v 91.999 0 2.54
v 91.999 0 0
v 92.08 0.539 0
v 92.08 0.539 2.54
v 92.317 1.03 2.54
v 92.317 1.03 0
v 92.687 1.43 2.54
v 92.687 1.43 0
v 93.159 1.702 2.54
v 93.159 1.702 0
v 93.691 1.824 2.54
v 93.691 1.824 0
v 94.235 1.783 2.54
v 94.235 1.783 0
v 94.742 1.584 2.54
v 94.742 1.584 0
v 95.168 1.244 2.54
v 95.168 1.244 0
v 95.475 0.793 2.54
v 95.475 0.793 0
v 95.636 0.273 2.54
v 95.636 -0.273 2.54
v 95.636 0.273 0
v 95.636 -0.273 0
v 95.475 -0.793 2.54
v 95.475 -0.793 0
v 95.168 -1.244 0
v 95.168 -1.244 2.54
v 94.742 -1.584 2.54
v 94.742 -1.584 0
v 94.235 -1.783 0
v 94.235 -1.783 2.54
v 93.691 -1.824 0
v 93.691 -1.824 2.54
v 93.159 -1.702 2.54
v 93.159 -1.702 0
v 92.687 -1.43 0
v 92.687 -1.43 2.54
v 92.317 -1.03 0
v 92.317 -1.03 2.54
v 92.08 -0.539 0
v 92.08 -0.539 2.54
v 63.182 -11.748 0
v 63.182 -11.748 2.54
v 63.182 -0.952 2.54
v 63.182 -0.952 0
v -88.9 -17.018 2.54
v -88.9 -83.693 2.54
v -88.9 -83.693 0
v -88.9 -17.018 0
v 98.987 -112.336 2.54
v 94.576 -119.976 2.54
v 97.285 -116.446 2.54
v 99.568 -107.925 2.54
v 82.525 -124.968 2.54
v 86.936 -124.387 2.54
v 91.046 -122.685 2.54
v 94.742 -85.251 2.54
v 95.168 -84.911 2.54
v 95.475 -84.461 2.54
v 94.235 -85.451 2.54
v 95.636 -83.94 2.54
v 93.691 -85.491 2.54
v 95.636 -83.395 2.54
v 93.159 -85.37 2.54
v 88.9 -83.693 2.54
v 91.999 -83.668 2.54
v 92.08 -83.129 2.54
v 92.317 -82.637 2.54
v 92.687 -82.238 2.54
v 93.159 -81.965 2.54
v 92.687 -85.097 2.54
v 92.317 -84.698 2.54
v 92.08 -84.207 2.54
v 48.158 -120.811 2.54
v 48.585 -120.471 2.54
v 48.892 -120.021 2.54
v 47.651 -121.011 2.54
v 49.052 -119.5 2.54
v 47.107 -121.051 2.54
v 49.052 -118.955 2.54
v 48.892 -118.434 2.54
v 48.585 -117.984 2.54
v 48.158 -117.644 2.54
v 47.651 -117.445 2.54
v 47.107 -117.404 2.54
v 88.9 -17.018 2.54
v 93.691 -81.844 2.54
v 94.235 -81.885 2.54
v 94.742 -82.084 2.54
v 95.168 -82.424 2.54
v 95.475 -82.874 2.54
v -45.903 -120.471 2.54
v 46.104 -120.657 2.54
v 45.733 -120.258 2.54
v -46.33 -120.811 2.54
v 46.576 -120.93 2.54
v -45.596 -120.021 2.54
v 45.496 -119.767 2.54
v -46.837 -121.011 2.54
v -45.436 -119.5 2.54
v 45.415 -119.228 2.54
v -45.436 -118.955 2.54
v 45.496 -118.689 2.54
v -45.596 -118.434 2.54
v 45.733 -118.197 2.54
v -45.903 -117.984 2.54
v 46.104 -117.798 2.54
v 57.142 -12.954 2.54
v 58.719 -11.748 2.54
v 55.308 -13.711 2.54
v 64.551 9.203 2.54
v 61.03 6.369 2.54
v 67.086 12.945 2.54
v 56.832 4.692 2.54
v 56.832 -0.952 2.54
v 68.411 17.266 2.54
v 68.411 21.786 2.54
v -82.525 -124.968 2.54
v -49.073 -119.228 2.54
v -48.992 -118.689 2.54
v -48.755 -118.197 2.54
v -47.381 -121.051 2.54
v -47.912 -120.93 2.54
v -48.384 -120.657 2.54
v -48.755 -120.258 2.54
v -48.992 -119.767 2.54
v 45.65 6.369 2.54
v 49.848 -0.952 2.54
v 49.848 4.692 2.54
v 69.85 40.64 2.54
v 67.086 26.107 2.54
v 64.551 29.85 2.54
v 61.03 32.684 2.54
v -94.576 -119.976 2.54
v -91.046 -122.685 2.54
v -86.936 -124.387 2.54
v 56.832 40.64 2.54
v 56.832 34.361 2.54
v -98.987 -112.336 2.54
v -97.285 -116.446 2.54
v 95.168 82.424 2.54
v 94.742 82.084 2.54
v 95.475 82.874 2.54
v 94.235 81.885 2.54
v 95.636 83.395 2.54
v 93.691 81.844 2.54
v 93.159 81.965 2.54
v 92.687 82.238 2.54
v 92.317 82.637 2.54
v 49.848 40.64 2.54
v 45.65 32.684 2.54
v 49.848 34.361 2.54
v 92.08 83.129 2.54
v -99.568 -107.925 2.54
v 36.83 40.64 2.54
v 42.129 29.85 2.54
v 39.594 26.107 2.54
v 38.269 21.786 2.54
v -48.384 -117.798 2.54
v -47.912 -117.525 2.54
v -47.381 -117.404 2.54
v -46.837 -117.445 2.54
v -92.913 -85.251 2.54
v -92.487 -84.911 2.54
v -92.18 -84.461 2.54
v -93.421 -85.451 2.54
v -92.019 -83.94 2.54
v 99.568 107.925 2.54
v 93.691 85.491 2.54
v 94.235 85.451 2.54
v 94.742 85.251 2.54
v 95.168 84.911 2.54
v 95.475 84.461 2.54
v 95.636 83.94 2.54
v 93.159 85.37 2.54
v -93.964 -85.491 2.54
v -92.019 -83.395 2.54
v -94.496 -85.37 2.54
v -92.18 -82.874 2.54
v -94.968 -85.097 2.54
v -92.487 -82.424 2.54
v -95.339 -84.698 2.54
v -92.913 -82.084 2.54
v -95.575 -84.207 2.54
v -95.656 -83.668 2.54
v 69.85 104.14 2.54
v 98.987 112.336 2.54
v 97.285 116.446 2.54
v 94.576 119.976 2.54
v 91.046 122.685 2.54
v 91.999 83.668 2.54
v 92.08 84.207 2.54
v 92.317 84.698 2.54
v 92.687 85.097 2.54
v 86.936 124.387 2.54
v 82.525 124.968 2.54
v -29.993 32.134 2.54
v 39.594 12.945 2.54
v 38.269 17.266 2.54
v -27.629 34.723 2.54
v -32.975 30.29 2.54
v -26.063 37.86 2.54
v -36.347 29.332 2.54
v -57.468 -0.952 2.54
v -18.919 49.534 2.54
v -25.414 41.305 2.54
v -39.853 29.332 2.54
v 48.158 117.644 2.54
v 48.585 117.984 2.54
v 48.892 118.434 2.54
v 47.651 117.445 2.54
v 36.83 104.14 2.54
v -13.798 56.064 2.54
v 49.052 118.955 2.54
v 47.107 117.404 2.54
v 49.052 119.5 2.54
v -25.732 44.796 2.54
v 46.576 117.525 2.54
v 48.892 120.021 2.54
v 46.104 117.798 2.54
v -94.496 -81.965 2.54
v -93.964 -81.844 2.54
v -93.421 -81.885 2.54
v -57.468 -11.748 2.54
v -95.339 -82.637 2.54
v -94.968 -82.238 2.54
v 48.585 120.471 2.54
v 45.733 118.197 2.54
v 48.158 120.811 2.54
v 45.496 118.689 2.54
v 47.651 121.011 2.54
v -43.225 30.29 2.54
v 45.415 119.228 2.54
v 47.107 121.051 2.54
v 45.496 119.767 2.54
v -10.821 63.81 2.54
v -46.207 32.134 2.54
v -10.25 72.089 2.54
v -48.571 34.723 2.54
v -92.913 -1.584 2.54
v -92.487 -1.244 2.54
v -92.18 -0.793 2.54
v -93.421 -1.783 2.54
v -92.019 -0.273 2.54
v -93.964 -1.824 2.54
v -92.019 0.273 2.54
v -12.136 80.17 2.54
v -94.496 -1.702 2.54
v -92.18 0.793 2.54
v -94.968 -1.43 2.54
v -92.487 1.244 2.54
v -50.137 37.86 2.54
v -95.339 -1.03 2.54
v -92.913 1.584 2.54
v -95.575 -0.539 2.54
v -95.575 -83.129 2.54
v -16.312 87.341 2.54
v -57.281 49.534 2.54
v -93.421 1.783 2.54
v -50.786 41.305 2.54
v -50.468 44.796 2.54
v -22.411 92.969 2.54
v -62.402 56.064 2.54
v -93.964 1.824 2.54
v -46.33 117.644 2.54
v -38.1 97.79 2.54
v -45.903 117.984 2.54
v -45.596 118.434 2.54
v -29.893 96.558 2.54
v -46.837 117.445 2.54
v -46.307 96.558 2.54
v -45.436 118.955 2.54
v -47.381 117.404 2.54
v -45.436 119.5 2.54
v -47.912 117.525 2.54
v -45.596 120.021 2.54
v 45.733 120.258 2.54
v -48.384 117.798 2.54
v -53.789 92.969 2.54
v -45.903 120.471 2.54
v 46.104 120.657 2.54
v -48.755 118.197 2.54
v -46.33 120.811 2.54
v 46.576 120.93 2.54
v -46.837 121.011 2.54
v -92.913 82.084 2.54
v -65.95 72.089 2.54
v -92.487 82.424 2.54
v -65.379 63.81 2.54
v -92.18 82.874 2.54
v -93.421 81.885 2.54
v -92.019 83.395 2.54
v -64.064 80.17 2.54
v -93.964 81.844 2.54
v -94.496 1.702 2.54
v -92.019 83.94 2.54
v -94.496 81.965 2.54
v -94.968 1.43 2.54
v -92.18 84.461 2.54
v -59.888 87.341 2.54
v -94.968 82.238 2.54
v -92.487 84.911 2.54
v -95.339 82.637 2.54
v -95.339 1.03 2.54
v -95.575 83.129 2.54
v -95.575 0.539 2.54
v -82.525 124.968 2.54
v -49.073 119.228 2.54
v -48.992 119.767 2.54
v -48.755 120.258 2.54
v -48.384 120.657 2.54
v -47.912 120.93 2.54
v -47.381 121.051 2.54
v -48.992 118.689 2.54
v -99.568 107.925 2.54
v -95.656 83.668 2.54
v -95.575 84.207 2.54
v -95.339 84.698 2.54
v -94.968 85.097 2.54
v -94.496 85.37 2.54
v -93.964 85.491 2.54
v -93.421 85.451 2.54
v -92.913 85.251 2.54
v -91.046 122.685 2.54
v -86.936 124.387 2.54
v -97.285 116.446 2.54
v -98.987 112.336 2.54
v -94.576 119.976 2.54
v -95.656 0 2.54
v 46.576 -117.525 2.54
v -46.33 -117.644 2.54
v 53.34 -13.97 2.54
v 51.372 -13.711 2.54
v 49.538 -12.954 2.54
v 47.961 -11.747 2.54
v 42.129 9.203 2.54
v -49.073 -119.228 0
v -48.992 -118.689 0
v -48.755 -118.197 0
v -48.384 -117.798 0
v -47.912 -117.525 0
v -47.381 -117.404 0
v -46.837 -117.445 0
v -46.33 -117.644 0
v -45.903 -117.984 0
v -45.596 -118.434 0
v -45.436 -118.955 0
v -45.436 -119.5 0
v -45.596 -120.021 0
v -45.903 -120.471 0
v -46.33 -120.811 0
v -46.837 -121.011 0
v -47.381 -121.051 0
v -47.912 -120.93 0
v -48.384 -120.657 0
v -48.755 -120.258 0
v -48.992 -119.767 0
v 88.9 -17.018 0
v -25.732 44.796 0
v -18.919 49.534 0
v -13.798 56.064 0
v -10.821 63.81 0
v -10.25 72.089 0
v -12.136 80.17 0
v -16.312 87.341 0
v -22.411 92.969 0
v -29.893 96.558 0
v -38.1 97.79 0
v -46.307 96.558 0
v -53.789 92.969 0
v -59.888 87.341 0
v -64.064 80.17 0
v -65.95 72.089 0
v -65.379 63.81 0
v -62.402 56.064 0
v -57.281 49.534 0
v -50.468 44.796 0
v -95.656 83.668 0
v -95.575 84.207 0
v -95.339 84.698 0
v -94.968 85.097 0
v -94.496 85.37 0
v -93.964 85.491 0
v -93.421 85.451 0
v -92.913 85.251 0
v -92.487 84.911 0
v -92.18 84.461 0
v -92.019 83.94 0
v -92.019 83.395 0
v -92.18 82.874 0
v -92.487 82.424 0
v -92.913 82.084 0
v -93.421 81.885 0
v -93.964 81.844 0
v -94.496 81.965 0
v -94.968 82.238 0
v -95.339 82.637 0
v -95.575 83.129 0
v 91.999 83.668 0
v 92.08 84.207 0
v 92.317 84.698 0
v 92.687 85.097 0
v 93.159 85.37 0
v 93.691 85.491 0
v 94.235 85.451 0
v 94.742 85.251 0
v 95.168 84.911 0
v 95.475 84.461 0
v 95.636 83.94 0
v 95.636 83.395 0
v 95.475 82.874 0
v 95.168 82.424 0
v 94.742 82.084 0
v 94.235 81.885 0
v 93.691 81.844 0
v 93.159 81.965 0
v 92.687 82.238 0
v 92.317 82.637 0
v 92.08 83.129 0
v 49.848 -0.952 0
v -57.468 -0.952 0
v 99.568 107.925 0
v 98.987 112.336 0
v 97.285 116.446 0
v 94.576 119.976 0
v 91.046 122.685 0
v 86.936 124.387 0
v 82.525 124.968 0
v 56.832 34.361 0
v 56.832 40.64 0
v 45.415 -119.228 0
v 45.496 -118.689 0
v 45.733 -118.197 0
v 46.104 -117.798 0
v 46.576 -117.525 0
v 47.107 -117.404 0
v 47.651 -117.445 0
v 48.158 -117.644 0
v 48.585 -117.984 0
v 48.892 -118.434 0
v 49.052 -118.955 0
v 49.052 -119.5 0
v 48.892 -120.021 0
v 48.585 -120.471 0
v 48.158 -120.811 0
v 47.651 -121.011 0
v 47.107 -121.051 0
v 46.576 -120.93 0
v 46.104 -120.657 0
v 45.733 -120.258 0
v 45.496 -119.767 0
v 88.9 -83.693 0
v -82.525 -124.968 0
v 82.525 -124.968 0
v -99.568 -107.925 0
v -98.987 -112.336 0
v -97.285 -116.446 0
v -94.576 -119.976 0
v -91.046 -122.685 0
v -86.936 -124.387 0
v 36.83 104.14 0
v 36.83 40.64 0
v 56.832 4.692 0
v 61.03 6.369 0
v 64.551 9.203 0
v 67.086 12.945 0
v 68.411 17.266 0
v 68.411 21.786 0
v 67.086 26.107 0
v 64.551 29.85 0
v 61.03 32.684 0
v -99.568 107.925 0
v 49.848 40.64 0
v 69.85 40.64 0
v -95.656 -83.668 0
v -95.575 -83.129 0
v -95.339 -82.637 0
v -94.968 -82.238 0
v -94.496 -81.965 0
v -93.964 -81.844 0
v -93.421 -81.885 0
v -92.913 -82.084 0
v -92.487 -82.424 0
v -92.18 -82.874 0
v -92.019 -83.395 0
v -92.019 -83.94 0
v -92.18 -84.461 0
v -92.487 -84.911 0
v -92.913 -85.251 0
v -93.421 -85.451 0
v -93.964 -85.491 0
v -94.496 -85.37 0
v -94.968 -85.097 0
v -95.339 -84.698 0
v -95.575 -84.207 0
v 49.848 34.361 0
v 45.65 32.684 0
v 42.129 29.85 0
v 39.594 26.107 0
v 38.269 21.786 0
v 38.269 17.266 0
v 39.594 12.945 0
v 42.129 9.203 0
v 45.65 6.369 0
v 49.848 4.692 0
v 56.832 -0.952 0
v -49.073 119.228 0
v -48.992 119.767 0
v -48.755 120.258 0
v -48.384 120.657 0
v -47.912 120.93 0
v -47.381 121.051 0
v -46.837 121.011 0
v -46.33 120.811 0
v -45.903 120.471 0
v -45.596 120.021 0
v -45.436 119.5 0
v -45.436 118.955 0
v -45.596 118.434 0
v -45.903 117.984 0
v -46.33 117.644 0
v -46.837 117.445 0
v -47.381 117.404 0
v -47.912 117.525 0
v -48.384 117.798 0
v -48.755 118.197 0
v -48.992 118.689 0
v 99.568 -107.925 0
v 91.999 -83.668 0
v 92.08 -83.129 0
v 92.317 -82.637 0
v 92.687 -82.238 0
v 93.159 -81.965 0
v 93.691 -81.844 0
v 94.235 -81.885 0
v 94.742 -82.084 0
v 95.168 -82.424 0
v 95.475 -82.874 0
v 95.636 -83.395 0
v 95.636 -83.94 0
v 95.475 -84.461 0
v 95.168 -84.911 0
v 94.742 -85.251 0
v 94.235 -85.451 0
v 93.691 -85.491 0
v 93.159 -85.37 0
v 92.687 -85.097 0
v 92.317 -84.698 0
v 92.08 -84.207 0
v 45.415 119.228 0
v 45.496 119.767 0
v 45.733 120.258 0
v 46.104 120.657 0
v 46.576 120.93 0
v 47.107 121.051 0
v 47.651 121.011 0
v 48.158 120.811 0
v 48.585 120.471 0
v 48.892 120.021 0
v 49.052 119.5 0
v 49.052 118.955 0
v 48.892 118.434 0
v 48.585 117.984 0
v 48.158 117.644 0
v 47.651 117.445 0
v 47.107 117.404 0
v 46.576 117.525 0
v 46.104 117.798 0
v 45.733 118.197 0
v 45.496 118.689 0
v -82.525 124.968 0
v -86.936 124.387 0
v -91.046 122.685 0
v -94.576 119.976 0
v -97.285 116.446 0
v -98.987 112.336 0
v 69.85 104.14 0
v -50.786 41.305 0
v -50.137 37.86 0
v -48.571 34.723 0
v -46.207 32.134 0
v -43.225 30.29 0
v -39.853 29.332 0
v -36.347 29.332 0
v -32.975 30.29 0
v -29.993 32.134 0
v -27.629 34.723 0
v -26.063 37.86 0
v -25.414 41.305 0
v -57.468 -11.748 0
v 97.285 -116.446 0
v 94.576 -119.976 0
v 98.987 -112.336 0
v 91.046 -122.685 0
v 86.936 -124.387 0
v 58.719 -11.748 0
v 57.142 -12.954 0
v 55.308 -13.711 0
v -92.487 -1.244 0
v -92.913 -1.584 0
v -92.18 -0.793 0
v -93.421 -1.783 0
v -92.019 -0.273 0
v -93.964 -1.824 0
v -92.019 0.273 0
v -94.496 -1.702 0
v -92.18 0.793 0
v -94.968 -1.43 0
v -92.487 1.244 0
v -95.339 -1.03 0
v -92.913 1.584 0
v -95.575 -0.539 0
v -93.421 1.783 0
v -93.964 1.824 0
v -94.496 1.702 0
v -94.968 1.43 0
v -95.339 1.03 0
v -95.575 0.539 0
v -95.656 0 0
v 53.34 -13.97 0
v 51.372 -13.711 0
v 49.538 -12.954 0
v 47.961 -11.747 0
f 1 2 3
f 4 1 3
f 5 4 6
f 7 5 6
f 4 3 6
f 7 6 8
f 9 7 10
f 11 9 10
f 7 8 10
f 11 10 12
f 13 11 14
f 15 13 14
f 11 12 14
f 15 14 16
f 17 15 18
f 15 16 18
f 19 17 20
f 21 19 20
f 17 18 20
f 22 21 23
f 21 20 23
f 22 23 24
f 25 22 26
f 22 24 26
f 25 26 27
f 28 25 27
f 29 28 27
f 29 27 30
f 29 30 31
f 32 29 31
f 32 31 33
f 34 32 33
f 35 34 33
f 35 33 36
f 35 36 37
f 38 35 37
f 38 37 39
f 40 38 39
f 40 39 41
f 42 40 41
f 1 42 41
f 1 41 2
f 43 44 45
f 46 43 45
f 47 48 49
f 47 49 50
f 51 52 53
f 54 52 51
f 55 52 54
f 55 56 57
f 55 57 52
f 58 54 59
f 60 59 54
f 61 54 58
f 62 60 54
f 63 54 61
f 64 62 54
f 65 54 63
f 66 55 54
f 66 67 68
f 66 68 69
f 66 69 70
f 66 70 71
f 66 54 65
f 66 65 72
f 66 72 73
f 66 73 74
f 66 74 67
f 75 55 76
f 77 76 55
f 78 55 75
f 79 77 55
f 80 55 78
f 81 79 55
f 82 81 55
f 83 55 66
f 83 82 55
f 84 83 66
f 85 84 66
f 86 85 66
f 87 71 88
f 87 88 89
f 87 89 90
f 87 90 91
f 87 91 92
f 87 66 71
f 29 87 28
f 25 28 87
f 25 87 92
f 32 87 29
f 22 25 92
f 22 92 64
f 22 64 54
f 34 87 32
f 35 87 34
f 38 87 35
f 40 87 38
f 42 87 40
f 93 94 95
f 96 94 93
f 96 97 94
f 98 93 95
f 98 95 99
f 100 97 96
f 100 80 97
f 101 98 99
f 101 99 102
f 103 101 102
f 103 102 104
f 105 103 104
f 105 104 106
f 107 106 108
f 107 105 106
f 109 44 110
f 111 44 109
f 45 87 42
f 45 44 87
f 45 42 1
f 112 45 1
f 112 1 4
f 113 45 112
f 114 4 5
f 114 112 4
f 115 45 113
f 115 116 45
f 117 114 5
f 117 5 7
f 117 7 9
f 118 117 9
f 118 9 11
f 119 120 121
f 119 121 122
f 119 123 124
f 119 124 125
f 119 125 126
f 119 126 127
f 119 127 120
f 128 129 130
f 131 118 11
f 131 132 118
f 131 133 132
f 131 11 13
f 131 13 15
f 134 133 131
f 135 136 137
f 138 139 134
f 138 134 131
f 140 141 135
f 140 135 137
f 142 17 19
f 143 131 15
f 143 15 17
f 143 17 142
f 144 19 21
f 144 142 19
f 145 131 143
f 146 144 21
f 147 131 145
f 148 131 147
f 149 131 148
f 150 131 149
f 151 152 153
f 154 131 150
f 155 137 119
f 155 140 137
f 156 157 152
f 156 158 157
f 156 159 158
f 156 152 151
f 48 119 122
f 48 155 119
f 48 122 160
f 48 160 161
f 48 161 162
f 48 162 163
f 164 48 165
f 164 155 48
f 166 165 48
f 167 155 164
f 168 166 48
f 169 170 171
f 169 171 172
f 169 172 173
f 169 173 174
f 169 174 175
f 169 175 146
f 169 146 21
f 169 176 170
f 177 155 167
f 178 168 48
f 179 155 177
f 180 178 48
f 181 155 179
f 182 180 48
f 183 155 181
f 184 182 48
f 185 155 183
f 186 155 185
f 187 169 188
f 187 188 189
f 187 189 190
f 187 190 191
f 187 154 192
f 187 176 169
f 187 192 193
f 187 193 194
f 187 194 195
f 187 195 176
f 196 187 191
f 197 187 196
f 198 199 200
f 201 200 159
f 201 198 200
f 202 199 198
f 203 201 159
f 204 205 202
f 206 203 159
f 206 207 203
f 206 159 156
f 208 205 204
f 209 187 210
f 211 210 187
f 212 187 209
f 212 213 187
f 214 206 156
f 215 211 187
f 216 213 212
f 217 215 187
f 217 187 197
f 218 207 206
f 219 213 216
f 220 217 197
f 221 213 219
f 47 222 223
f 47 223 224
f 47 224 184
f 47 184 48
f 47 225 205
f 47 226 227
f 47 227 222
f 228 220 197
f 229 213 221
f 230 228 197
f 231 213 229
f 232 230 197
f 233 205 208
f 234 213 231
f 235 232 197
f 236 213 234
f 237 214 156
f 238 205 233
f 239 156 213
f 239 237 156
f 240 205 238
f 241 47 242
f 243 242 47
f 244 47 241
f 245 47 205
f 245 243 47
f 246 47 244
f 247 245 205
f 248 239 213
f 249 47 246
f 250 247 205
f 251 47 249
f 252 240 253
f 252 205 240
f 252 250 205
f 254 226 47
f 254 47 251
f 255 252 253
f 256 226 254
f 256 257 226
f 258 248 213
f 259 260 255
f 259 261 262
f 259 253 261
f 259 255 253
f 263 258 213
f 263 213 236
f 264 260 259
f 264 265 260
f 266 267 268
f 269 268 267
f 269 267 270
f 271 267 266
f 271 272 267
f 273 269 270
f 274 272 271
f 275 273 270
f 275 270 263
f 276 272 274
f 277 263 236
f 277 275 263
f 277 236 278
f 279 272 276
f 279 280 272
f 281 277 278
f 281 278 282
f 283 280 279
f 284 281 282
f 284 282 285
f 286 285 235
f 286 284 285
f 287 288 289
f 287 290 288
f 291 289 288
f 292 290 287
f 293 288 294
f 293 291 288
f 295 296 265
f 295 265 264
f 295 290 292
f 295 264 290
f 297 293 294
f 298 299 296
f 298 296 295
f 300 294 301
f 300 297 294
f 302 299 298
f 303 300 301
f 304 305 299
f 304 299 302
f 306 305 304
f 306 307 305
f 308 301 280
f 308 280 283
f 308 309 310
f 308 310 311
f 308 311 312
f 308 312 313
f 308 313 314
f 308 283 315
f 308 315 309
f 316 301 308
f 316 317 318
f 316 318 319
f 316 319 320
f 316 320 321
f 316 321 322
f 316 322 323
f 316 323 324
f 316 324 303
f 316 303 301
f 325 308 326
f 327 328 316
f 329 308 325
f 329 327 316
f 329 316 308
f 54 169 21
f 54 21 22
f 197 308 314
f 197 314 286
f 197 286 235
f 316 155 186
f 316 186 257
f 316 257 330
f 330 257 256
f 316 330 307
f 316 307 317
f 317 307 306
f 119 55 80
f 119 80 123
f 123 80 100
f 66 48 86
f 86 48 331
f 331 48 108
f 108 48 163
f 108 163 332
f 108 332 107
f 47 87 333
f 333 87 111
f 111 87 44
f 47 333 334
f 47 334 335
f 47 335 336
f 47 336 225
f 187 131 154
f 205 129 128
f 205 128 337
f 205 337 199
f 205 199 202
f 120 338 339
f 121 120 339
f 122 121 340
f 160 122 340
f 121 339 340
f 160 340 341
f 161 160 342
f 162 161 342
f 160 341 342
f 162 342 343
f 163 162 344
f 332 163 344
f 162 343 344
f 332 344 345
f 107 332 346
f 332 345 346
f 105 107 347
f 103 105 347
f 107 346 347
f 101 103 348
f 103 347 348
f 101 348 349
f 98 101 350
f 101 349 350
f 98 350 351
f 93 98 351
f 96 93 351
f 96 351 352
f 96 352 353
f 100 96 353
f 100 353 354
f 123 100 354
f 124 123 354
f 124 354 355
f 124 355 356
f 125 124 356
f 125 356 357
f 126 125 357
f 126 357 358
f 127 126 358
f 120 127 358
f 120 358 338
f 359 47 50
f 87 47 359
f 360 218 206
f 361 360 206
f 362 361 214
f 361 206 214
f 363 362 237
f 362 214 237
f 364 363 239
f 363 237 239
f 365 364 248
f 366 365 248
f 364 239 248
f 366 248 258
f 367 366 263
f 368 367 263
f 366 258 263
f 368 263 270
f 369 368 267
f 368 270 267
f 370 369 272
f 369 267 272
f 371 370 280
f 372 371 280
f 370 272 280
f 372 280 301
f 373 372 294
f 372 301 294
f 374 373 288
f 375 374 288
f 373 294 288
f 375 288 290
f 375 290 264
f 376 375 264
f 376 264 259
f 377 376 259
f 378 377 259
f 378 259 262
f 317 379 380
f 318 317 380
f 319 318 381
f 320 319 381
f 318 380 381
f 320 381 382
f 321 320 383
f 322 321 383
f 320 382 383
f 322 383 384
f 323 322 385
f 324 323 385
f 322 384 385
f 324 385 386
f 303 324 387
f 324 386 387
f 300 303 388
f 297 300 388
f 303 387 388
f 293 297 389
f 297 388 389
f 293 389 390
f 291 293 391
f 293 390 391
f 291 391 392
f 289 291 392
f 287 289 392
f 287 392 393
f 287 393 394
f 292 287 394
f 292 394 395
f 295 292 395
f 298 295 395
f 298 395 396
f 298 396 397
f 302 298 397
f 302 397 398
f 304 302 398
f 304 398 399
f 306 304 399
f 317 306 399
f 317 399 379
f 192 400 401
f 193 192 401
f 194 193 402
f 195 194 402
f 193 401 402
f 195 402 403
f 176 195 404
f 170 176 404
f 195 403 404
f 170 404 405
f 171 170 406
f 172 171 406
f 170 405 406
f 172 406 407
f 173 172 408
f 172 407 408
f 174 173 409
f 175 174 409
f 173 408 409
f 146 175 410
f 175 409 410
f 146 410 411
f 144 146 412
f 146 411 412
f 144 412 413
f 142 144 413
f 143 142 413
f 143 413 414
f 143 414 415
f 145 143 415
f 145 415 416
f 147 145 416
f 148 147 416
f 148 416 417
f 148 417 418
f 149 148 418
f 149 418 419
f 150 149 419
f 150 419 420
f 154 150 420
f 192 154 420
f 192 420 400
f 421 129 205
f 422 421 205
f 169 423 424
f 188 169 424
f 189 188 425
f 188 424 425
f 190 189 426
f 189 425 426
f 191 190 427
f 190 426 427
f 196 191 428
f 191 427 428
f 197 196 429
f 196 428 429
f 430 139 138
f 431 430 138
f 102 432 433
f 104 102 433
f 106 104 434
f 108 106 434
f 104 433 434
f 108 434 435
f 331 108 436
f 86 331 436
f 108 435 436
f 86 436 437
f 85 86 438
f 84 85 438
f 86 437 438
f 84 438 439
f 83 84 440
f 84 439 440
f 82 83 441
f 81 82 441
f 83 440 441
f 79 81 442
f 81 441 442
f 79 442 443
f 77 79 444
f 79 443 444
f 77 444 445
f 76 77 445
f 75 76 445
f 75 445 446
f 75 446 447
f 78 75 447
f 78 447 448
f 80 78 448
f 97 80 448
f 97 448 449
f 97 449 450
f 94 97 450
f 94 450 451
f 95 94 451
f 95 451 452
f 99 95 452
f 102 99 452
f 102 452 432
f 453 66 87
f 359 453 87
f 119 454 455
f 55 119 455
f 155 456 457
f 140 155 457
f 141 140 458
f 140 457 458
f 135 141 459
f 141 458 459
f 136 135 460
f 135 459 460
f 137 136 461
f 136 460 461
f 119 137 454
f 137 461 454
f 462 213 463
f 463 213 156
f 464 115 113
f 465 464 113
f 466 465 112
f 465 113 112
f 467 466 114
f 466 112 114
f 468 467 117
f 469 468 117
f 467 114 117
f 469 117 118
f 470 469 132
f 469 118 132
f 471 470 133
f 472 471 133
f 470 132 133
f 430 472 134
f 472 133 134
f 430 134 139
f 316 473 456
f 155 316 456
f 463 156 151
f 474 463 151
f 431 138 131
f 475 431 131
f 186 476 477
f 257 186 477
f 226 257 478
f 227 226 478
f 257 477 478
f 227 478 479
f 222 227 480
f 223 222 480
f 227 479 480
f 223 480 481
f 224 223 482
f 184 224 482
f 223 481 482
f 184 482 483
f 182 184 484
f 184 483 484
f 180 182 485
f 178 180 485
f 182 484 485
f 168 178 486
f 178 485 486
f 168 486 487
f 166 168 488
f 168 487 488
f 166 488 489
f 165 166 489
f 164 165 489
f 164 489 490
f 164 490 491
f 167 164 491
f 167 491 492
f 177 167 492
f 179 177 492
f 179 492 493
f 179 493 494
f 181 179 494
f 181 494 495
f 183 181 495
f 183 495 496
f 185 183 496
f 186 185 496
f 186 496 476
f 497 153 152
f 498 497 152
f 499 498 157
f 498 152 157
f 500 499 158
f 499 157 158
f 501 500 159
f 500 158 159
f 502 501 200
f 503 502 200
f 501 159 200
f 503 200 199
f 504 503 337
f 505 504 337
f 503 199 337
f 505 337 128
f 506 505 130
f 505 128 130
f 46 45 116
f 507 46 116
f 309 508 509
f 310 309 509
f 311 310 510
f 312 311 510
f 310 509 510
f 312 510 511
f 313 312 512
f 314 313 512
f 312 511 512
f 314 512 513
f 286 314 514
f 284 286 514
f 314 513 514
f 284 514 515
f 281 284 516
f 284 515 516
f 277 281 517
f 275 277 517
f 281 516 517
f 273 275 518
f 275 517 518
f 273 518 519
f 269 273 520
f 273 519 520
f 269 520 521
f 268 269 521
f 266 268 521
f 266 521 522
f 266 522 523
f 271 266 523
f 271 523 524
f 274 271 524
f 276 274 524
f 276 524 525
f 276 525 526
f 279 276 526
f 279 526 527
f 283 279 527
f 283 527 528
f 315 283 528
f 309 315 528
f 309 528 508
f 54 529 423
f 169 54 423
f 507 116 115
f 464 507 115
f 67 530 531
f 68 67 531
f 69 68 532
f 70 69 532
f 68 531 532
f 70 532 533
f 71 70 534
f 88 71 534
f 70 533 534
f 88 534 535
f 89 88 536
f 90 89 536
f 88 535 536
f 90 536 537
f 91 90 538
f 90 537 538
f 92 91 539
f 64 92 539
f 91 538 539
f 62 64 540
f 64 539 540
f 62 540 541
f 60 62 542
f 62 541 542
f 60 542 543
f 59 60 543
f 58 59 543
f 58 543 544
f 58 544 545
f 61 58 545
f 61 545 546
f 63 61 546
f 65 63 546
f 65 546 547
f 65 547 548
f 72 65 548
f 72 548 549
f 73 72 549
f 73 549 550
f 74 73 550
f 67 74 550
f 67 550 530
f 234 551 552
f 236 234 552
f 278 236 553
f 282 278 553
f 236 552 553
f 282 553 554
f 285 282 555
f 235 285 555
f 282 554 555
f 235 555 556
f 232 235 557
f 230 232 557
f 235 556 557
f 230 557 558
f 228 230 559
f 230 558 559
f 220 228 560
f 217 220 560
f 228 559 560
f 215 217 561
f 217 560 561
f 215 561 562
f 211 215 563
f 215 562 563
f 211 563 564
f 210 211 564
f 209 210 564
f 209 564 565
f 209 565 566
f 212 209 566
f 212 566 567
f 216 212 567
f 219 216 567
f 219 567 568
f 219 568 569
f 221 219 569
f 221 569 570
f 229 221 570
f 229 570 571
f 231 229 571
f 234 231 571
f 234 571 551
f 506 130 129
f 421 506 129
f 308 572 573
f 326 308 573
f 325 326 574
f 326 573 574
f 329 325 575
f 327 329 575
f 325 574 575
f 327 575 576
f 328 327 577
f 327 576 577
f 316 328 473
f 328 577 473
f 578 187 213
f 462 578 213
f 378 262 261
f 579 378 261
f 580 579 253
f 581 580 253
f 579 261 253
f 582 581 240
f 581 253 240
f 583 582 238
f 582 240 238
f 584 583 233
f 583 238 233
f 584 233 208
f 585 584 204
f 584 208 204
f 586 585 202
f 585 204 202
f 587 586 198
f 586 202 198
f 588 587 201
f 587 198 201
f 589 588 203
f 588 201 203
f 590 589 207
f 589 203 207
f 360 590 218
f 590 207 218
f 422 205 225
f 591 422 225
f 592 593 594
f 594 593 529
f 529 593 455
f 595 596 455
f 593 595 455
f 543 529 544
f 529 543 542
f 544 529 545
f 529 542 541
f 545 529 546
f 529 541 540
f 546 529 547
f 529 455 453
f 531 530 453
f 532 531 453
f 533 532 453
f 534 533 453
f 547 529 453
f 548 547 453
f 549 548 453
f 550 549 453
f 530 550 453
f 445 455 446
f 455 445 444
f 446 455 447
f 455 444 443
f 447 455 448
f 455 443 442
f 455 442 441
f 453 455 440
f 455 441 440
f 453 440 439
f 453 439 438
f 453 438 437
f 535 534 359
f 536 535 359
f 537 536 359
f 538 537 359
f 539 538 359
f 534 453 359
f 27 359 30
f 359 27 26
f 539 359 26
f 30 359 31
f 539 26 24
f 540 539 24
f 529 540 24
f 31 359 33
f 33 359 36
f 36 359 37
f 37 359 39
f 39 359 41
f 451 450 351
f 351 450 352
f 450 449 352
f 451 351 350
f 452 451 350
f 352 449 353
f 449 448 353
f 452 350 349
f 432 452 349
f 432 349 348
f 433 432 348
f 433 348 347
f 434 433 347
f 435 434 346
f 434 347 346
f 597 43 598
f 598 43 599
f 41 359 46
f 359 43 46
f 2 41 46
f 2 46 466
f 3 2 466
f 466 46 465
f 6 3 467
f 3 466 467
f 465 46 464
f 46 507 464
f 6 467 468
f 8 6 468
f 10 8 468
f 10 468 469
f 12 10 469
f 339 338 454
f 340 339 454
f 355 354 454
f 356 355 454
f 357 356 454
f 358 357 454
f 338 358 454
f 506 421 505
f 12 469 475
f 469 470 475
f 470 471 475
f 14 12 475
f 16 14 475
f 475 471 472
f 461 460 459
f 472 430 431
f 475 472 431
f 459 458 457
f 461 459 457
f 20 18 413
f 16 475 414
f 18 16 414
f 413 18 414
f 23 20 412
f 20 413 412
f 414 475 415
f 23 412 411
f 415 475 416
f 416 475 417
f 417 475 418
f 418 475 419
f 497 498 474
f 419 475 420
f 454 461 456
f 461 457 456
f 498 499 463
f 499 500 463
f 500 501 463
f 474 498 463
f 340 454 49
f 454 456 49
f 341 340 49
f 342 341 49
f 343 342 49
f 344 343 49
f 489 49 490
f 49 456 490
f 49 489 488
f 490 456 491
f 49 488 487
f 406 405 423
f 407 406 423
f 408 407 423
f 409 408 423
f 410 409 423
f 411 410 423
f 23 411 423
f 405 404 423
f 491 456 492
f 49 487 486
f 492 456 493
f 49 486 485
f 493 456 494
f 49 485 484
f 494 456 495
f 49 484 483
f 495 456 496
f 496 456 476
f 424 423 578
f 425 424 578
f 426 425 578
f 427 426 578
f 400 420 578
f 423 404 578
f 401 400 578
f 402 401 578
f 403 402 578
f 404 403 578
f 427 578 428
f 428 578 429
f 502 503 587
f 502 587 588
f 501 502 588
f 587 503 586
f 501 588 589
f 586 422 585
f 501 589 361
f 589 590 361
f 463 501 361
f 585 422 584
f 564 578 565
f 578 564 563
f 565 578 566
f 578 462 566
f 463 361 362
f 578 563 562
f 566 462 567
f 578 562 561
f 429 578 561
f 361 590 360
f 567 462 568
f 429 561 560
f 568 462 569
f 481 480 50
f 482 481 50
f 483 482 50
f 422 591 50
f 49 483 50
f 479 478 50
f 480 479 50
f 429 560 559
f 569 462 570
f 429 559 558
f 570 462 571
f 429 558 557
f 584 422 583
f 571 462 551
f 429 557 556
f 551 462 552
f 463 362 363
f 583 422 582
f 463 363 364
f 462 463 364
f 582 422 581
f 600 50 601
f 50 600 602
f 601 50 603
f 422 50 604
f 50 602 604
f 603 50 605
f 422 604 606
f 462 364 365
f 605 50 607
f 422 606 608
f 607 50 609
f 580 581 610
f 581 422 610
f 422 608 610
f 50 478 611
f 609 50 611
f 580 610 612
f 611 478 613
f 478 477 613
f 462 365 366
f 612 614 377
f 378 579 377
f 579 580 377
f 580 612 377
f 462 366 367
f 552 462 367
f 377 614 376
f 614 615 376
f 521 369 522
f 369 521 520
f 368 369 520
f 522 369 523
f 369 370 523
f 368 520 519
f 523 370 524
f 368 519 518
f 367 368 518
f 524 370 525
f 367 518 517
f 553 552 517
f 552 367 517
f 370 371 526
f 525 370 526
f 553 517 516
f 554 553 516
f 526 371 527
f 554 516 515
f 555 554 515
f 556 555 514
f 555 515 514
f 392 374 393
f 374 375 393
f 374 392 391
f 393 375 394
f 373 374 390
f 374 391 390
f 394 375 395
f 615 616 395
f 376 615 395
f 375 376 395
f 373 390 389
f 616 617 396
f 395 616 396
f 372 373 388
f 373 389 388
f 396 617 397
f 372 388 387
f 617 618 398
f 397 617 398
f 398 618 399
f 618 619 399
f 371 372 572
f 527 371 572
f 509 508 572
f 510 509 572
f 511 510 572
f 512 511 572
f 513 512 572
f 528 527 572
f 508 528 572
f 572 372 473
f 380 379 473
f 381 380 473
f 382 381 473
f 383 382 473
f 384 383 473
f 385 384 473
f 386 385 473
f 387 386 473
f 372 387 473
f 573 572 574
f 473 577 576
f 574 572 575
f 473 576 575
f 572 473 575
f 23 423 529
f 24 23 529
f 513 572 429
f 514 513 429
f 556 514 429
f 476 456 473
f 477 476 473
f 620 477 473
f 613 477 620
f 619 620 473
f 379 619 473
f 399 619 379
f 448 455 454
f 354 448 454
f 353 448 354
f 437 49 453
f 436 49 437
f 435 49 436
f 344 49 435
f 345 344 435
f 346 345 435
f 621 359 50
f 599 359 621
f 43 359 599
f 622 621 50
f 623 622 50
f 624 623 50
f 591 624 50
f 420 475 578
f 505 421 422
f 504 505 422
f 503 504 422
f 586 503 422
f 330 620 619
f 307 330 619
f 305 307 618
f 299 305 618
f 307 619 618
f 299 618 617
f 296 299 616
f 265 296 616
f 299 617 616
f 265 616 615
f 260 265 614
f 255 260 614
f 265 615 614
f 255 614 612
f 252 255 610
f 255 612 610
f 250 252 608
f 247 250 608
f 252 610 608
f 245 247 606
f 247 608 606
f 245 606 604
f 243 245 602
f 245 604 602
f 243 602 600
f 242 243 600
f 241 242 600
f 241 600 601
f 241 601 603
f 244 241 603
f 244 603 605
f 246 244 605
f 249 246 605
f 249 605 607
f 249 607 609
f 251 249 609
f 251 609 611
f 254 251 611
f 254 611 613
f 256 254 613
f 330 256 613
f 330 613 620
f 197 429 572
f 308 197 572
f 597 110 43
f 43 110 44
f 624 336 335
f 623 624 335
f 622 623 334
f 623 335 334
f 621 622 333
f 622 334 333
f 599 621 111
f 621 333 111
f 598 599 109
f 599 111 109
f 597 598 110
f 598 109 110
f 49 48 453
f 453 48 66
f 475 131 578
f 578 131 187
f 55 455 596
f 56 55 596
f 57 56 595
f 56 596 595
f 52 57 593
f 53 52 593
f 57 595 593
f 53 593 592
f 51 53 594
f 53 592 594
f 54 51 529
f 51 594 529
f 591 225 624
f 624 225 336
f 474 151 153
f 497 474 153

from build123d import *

# Parameters (mm, degrees)
BOSS_EXTRUDE1_DEPTH         = 2.54
CUT_EXTRUDE1_DEPTH          = 3.54
SKETCH7_W                   = 177.8
SKETCH7_H                   = 66.675
CUT_EXTRUDE2_DEPTH          = 3.54
F_27_0_144_DIAMETER_HOLE1_D = 3.6576


with BuildPart() as part:
    # Sketch1 → Boss-Extrude1 (new body)
    with BuildSketch(Plane(origin=(0, 0, 0), x_dir=(0, 1, 0), z_dir=(0, 0, 1))):
        with BuildLine():
            Line((-107.9246, -99.568), (107.9246, -99.568))
            ThreePointArc((107.9246, -99.568), (119.976103714, -94.576103714), (124.968, -82.5246))
            Line((124.968, -82.5246), (124.968, 82.5246))
            ThreePointArc((124.968, 82.5246), (119.976103714, 94.576103714), (107.9246, 99.568))
            Line((107.9246, 99.568), (-107.9246, 99.568))
            ThreePointArc((-107.9246, 99.568), (-119.976103714, 94.576103714), (-124.968, 82.5246))
            Line((-124.968, 82.5246), (-124.968, -82.5246))
            ThreePointArc((-124.968, -82.5246), (-119.976103714, -94.576103714), (-107.9246, -99.568))
        make_face()
    extrude(amount=BOSS_EXTRUDE1_DEPTH)

    # Sketch6 → Cut-Extrude1 (cut, through all)
    with BuildSketch(Plane.XY.offset(2.54)):
        with BuildLine():
            Line((49.8475, 4.691829089), (49.8475, -0.9525))
            Line((49.8475, -0.9525), (-57.4675, -0.9525))
            Line((-57.4675, -0.9525), (-57.4675, -11.7475))
            Line((-57.4675, -11.7475), (47.961208895, -11.7475))
            ThreePointArc((47.961208895, -11.7475), (53.34, -13.97), (58.718791105, -11.7475))
            Line((58.718791105, -11.7475), (63.1825, -11.7475))
            Line((63.1825, -11.7475), (63.1825, -0.9525))
            Line((63.1825, -0.9525), (56.8325, -0.9525))
            Line((56.8325, -0.9525), (56.8325, 4.691829089))
            ThreePointArc((56.8325, 4.691829089), (68.58, 19.52625), (56.8325, 34.360670911))
            Line((56.8325, 34.360670911), (56.8325, 40.64))
            Line((56.8325, 40.64), (69.85, 40.64))
            Line((69.85, 40.64), (69.85, 104.14))
            Line((69.85, 104.14), (36.83, 104.14))
            Line((36.83, 104.14), (36.83, 40.64))
            Line((36.83, 40.64), (49.8475, 40.64))
            Line((49.8475, 40.64), (49.8475, 34.360670911))
            ThreePointArc((49.8475, 34.360670911), (38.1, 19.52625), (49.8475, 4.691829089))
        make_face()
        with BuildLine():
            ThreePointArc((-25.732344403, 44.796363636), (-38.1, 97.79), (-50.467655597, 44.796363636))
            ThreePointArc((-50.467655597, 44.796363636), (-38.1, 29.21), (-25.732344403, 44.796363636))
        make_face()
    extrude(amount=-CUT_EXTRUDE1_DEPTH, mode=Mode.SUBTRACT)

    # Sketch7 → Cut-Extrude2 (cut, through all)
    with BuildSketch(Plane.XY.offset(2.54)):
        with Locations((0, -50.3555)):
            Rectangle(SKETCH7_W, SKETCH7_H)
    extrude(amount=-CUT_EXTRUDE2_DEPTH, mode=Mode.SUBTRACT)

    # #27 (0.144) Diameter Hole1 (through all)
    with Locations(Plane.XY.offset(2.54)):
        with Locations((93.8276, 0), (-93.8276, 0), (47.244, -119.2276), (-47.244, -119.2276), (93.8276, -83.6676), (-93.8276, -83.6676), (-93.8276, 83.6676), (93.8276, 83.6676), (-47.244, 119.2276), (47.244, 119.2276)):
            Hole(F_27_0_144_DIAMETER_HOLE1_D / 2)


solid = part.part
